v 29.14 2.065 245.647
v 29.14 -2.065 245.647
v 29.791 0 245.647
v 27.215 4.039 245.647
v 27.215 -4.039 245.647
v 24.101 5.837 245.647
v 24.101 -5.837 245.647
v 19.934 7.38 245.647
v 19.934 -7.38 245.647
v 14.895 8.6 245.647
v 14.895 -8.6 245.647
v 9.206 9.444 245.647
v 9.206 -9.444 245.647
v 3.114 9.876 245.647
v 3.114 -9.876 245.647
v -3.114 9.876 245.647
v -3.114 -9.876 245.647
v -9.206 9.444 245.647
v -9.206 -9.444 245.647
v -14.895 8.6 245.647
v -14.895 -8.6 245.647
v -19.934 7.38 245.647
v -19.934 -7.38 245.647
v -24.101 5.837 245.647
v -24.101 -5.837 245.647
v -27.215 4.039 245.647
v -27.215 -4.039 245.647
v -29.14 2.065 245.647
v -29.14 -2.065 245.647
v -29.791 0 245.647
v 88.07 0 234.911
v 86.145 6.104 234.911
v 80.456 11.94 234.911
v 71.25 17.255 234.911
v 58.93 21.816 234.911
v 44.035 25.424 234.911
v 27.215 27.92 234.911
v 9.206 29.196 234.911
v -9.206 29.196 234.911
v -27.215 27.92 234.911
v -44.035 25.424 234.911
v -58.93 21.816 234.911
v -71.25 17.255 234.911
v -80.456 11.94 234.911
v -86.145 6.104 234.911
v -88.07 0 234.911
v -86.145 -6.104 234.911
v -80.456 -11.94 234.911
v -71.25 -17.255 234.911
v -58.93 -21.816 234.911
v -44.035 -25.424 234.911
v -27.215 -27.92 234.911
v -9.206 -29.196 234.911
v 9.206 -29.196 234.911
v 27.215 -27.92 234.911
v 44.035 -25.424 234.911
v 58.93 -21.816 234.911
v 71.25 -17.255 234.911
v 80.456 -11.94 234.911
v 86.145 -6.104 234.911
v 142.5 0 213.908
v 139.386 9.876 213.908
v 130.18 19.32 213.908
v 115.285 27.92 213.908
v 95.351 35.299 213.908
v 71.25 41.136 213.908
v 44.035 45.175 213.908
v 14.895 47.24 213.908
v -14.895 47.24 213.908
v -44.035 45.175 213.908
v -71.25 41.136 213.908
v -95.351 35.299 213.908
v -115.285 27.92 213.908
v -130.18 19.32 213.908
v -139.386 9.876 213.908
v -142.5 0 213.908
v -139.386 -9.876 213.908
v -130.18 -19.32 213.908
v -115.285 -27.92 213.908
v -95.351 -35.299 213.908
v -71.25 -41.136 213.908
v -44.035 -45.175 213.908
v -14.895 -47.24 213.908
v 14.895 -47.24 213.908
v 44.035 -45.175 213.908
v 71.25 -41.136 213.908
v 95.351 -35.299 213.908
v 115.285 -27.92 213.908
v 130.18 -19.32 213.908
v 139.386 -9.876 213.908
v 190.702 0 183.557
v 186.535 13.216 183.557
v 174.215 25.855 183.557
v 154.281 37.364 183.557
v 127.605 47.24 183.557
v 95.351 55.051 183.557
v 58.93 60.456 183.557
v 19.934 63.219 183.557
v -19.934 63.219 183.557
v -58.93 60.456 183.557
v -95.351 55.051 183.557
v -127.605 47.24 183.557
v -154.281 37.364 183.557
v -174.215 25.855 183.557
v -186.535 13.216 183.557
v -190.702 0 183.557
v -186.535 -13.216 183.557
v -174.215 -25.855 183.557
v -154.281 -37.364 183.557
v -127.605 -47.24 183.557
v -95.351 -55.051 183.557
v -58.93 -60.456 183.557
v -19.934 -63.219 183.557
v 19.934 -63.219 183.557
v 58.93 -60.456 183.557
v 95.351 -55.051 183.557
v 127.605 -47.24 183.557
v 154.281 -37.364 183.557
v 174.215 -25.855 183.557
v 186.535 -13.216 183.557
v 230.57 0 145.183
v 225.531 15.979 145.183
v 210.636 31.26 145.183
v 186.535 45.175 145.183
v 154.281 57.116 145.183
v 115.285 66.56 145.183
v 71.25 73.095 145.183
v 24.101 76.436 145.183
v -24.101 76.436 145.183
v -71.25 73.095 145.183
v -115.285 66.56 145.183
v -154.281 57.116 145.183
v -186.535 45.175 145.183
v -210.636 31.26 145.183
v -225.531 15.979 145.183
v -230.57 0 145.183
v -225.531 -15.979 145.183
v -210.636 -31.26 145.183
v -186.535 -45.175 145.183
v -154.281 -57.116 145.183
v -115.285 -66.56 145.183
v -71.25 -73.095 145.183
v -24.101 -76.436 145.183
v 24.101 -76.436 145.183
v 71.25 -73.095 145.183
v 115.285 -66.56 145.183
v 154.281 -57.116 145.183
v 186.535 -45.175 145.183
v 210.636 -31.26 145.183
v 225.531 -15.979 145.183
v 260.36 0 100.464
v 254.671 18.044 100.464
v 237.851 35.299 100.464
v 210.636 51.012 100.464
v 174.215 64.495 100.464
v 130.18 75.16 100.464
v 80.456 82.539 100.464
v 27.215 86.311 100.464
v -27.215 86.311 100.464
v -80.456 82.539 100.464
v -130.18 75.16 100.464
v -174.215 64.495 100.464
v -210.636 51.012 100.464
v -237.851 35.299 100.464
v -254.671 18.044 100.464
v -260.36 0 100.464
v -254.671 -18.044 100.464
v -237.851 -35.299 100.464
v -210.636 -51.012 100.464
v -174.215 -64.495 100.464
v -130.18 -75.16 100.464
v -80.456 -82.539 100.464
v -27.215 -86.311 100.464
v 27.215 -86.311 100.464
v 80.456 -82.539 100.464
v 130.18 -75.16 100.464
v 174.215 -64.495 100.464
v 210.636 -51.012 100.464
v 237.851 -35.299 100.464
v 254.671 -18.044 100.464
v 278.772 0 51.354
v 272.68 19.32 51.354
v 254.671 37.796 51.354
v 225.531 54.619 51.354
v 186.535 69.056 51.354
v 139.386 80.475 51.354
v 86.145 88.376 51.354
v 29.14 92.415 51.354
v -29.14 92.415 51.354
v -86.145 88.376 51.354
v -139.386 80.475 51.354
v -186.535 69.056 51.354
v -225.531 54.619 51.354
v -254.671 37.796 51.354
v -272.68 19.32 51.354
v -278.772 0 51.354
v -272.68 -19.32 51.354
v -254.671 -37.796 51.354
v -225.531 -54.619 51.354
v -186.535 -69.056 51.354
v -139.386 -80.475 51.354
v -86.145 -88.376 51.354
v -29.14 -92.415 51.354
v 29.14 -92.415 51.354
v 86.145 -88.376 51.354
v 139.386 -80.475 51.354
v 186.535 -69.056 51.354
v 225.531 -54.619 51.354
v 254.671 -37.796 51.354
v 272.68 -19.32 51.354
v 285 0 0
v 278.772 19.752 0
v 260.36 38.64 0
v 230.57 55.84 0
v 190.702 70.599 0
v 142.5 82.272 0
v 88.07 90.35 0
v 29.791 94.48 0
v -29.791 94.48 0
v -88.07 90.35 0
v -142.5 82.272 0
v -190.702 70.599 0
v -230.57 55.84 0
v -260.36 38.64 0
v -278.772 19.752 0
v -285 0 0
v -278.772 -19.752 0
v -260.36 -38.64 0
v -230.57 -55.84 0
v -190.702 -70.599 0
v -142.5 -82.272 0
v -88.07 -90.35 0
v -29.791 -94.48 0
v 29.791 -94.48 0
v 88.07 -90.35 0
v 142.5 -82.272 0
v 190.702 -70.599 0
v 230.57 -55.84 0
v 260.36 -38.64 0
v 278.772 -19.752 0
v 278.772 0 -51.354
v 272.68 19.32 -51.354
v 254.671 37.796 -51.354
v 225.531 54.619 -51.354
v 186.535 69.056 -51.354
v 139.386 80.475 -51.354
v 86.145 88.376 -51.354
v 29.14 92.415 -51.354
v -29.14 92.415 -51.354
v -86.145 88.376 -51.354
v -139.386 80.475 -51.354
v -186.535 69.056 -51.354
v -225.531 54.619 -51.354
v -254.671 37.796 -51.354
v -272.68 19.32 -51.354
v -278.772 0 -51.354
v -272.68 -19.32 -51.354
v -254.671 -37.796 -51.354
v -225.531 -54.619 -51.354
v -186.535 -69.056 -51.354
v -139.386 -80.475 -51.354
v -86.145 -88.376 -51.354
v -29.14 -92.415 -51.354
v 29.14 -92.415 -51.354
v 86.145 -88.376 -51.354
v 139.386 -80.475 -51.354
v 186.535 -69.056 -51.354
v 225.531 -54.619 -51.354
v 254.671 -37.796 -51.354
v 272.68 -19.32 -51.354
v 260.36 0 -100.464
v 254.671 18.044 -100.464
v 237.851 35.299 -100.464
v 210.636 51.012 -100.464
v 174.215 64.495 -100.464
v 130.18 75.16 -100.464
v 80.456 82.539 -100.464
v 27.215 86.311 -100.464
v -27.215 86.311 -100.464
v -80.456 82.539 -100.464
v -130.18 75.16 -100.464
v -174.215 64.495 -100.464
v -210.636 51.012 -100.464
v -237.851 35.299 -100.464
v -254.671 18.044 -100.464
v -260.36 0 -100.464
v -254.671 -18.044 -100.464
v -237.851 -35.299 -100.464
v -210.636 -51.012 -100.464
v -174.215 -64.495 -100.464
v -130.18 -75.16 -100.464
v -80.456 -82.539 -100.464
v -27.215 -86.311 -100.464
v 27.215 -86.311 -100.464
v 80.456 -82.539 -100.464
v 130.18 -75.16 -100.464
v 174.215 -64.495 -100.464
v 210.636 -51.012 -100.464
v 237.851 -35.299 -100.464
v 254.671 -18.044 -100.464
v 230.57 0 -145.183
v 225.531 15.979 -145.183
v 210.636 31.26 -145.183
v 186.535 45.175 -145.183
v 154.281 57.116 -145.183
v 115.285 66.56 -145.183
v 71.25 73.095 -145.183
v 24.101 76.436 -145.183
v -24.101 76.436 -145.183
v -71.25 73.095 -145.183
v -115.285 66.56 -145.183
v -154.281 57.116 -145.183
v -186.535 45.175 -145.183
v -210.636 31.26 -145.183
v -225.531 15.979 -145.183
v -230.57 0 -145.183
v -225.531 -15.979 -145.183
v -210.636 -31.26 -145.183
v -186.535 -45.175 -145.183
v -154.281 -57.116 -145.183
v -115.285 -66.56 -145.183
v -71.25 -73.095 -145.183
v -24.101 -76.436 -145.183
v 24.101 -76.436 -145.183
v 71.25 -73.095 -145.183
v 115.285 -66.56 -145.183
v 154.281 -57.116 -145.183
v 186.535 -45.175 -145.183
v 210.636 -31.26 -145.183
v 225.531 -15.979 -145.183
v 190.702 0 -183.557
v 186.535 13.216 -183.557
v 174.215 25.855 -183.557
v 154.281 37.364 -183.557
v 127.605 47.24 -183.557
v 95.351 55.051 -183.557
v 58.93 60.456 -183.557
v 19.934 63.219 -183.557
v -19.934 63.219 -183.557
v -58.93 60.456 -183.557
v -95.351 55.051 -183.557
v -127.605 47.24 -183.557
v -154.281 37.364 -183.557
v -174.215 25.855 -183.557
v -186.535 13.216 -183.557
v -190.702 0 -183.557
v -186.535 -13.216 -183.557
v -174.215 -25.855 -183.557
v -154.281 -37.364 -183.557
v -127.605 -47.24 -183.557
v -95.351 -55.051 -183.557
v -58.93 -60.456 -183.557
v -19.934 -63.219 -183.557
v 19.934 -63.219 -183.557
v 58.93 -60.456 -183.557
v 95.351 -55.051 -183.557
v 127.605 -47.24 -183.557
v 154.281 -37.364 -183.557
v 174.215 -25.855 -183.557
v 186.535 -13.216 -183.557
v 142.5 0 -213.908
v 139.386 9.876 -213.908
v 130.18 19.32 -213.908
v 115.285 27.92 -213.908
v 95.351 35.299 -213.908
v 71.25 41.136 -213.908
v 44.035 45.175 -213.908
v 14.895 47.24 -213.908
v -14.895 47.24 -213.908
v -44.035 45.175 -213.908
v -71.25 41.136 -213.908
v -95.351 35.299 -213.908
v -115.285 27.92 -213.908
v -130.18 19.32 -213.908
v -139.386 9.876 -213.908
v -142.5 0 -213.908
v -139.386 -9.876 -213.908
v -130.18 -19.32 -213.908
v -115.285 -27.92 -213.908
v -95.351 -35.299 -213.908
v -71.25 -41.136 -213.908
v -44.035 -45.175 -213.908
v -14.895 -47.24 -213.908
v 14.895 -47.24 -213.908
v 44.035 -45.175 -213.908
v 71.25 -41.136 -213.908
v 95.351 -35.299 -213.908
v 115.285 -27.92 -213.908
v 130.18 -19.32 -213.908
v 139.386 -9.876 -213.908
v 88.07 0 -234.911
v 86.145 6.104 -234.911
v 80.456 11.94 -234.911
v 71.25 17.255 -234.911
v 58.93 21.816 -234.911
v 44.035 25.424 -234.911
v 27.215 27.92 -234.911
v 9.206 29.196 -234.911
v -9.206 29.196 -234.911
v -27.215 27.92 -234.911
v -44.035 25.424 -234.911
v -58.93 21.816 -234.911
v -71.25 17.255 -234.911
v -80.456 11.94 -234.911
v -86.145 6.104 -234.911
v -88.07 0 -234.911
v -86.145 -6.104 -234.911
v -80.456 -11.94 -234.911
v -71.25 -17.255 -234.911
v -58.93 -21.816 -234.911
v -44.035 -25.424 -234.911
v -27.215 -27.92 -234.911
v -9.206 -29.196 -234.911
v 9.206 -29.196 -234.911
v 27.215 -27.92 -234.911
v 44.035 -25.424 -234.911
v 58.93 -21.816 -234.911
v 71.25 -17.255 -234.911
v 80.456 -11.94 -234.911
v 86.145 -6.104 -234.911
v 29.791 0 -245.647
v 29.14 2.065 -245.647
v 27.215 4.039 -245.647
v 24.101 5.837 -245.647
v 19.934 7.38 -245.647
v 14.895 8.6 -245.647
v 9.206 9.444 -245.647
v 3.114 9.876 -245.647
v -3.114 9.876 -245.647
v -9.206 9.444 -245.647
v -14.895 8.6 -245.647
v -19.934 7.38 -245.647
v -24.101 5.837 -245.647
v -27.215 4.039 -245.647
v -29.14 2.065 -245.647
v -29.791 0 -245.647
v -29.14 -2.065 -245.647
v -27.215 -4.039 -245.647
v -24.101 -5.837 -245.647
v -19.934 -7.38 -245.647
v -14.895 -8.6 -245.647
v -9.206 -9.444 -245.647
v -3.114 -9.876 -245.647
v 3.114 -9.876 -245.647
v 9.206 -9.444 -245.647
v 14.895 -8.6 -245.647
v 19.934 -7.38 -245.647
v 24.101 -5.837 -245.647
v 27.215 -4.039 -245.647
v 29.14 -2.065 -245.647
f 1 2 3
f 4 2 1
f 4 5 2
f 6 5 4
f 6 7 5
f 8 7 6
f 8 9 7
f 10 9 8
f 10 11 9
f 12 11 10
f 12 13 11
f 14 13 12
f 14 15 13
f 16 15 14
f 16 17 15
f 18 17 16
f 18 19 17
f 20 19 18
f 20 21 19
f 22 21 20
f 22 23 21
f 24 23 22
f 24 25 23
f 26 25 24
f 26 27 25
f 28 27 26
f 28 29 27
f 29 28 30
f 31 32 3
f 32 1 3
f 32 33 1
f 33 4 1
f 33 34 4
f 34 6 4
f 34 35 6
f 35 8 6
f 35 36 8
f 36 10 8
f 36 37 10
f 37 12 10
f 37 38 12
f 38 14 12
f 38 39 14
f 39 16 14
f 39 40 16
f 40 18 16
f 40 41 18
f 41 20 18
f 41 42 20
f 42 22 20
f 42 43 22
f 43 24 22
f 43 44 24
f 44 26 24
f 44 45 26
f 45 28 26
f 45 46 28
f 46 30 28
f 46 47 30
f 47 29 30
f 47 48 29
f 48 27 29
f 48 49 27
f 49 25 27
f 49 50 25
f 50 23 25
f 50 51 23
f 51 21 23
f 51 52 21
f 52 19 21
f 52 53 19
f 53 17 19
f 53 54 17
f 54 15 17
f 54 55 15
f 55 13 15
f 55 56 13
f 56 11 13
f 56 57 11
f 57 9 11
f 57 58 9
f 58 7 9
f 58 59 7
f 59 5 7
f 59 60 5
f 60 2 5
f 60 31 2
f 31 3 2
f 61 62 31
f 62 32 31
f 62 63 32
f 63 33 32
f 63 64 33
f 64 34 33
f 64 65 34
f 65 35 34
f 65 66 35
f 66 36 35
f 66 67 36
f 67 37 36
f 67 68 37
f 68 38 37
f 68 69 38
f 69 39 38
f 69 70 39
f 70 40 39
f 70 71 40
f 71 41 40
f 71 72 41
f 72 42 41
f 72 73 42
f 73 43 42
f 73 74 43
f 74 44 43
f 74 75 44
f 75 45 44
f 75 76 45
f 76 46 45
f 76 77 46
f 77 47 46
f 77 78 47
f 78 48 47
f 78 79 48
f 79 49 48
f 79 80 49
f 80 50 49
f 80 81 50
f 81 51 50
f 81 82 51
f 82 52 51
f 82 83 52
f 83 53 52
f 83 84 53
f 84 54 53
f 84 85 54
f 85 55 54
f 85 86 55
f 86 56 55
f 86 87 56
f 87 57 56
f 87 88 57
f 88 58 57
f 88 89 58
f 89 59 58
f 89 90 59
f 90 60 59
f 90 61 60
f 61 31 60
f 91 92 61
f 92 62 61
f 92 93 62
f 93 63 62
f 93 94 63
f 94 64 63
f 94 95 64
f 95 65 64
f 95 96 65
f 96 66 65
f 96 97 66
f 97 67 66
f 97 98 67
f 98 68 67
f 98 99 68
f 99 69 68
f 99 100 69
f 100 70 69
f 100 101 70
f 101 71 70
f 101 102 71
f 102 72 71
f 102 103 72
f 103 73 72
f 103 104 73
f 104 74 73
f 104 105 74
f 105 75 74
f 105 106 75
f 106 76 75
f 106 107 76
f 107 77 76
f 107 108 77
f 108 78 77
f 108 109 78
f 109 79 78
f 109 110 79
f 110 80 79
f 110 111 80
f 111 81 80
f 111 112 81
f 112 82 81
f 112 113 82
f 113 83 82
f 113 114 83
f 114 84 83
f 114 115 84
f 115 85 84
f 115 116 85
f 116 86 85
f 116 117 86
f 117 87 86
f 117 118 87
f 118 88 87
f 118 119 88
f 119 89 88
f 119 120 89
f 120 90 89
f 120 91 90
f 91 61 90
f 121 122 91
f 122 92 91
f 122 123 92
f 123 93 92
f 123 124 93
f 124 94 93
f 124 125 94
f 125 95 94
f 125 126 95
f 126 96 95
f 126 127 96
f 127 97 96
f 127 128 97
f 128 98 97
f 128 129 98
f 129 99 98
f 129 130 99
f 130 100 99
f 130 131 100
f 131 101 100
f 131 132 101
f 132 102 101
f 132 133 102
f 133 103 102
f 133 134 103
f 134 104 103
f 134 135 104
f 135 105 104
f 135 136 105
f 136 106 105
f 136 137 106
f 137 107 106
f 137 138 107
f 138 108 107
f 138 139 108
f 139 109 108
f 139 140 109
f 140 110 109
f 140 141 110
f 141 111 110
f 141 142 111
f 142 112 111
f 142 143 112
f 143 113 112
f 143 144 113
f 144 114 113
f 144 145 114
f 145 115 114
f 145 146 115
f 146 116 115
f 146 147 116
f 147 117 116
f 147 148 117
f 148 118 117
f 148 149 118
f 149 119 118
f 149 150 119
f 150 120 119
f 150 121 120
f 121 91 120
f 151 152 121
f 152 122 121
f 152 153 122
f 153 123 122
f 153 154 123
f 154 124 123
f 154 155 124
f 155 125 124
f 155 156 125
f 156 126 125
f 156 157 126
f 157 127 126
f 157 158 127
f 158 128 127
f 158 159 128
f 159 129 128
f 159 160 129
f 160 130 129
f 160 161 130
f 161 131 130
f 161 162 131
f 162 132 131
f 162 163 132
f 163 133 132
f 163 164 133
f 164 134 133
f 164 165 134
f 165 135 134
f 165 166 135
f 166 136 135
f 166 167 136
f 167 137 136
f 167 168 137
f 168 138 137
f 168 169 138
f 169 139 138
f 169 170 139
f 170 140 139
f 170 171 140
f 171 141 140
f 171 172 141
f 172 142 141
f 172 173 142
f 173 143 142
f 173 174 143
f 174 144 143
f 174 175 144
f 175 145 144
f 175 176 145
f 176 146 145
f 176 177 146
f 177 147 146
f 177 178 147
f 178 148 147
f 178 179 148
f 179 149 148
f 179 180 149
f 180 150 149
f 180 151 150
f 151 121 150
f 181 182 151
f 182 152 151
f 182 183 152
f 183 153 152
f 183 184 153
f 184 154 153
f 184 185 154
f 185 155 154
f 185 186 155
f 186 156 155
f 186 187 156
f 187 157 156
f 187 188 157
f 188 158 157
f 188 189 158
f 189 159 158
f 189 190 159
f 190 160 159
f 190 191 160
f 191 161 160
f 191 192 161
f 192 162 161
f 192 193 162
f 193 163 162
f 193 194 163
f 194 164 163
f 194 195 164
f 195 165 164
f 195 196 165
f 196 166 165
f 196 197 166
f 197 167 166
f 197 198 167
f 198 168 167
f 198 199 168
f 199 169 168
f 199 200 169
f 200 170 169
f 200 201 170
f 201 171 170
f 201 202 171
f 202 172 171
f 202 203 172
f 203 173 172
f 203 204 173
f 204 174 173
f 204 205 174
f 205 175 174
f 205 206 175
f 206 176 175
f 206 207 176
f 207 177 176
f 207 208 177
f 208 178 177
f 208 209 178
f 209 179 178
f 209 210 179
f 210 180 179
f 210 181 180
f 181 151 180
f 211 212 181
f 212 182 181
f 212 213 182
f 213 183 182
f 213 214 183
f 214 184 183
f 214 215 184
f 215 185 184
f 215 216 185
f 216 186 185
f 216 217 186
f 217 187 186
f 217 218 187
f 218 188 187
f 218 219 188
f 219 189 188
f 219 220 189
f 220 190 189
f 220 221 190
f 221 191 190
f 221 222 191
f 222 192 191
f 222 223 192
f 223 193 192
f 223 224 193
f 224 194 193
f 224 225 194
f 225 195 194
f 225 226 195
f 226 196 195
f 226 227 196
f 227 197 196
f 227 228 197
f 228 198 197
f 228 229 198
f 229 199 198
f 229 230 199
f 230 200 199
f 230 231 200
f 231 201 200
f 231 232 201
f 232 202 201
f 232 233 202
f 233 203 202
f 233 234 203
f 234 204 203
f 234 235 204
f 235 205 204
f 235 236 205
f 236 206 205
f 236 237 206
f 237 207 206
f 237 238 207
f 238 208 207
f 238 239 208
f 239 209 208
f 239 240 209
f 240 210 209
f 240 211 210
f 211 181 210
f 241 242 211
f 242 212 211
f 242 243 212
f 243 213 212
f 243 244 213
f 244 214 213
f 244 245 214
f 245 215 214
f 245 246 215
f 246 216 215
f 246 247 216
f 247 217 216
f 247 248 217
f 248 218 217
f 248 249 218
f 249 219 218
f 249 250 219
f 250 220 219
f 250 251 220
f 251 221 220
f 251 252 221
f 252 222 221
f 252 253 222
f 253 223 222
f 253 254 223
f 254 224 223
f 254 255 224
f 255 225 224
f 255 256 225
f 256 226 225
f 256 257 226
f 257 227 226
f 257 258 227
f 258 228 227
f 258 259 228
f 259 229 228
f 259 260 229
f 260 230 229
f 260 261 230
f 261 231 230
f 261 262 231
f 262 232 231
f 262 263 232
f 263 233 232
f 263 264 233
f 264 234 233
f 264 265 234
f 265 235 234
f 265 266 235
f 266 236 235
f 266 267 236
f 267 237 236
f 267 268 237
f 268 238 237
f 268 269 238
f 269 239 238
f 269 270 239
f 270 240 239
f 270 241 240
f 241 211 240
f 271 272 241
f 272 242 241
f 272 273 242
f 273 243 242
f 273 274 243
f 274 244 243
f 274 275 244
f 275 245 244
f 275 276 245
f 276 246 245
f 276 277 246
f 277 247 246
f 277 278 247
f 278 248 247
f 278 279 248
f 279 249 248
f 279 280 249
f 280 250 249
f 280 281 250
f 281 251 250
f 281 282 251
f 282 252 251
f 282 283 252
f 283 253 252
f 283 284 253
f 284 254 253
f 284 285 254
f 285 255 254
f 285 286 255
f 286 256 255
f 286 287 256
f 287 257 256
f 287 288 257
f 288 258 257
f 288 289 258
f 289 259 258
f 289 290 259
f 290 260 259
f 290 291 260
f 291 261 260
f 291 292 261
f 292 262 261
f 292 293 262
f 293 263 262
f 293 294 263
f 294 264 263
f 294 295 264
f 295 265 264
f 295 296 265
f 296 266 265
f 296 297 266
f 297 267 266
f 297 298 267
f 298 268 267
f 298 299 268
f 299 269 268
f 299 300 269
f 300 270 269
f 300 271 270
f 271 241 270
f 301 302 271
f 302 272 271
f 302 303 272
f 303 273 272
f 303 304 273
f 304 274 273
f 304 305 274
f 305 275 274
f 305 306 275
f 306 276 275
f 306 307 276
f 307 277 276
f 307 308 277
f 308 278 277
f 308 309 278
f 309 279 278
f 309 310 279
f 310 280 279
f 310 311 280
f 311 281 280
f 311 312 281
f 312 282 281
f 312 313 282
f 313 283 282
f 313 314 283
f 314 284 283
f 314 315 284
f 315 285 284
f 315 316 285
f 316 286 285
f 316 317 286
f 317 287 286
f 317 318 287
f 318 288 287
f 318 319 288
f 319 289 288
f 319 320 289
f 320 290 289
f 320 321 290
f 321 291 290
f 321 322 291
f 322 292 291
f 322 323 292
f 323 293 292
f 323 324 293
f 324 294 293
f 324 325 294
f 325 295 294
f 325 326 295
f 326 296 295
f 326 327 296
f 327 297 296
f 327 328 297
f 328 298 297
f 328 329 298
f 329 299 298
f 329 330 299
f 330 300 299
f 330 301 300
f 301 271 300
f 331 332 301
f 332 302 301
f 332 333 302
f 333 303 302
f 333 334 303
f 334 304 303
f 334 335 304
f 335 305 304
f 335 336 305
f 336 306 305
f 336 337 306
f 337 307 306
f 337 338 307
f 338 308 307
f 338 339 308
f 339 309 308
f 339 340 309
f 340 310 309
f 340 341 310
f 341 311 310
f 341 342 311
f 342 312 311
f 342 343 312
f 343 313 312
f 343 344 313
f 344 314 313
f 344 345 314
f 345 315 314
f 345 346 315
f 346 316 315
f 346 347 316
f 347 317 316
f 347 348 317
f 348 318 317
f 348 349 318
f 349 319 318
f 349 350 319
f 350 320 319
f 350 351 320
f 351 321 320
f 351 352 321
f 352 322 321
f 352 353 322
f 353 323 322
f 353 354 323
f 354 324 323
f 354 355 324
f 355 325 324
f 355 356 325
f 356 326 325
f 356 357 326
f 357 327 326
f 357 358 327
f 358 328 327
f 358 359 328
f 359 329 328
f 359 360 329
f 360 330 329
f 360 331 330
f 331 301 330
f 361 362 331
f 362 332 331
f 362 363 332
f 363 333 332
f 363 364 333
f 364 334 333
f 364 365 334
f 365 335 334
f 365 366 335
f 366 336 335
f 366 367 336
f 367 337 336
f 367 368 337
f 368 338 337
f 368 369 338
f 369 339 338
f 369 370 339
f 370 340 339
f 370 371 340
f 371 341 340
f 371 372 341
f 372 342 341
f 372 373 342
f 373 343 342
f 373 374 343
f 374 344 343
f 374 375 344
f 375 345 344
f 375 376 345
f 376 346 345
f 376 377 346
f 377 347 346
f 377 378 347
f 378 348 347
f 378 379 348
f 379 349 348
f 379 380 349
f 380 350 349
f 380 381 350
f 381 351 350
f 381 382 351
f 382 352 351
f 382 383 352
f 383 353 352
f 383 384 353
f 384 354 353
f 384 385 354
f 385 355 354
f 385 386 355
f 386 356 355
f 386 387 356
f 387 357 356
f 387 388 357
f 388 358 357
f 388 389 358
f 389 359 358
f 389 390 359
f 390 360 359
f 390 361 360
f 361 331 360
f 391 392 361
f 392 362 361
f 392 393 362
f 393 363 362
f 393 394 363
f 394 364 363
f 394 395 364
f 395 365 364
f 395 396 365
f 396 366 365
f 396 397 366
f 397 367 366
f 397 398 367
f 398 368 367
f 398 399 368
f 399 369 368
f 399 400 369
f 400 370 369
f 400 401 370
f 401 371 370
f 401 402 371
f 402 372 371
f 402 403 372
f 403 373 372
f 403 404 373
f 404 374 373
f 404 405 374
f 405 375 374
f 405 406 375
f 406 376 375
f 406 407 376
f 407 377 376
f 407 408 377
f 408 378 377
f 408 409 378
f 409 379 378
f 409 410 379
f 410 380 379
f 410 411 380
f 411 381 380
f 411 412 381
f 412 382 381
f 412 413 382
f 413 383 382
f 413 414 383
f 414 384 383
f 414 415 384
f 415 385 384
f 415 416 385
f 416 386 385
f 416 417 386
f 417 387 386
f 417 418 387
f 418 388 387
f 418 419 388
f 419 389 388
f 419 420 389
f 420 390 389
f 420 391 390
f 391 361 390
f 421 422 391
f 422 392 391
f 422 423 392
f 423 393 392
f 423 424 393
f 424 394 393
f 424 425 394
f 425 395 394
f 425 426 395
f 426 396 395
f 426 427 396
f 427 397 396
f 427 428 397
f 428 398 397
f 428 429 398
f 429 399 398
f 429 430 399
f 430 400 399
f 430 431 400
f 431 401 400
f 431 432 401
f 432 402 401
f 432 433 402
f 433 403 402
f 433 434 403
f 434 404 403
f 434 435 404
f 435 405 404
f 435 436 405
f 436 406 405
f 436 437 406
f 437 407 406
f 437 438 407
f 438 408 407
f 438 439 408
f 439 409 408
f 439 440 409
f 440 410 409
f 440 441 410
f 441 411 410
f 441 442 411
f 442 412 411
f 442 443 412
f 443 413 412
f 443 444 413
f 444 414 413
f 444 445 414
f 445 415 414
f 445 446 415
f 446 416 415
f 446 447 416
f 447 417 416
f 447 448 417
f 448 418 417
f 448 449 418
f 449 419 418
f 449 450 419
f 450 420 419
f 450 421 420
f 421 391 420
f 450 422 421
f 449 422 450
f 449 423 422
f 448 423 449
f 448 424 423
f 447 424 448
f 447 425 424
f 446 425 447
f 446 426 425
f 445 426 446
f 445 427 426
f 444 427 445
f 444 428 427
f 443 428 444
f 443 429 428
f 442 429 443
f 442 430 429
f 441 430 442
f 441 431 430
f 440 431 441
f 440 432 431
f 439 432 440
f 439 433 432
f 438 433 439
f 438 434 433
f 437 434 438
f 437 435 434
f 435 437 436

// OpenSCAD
// Generated by SolidPython 1.0.1 on 2020-07-29 00:46:51


scale(v = [15, 5, 13]) {
	sphere(r = 19);
}
/***********************************************
*********      SolidPython code:      **********
************************************************
 
# import packages: SolidPython
from solid import *
from solid.utils import *
from itertools import chain, combinations, permutations


class Resize:

    def __init__(self, scad_file):
        self.scad_file = scad_file
        #self.scad_file = import_scad(scad_file)
        # cone/cylinder param:
        self.r1 = 0
        self.r2 = 0
        self.h = 0
        # rectangular prism param:
        self.w = 0
        self.l = 0
        # ellipse param:
        self.r = 0

    # import OpenScad code (file name corresponds to shape)


    # classify shape + parameters
    def assign(self, param1, param2, param3):
        if self.scad_file == 'cone.scad':
            self.r1 = param1
            self.r2 = param2
            self.h = param3
        elif self.scad_file == 'cylinder.scad':
            self.r1 = param1
            self.r2 = param2
            self.h = param3
        elif self.scad_file == 'rectangularPrism.scad':
            self.h = param1
            self.l = param2
            self.w = param3
        else:
            self.r = param1
            self.h = param2

    # resize parameters
    def iterate(self):
        x = range(3, 20, 2)
        i = 1
        if self.scad_file == 'cone.scad':
            tempList = list(permutations(x, 2))
            for temp in tempList:
                param1 = temp[0]
                param2 = temp[1]
                filepath = 'produced_scad_files/' + 'cone' + str(param1) + '_' + str(param2) + '_' + '.scad'
                scad_render_to_file(cylinder(h=param1, r1=param2, r2=0), filepath)

        elif self.scad_file == 'cylinder.scad':
            tempList = list(permutations(x, 3))
            for temp in tempList:
                param1 = temp[0]
                param2 = temp[1]
                filepath = 'produced_scad_files/' + 'cylinder' + str(param1) + '_' + str(param2) + '_' + '.scad'
                scad_render_to_file(cylinder(h=param1, r1=param2, r2=param2), filepath)

        elif self.scad_file == 'rectangularPrism.scad':
            tempList = list(permutations(x, 3))
            for temp in tempList:
                param1 = temp[0]
                param2 = temp[1]
                param3 = temp[2]
                filepath = 'produced_scad_files/' + 'rectangularPrism' + str(param1) + '_' + str(param2) + '_' + str(
                    param3) + '.scad'
                scad_render_to_file(cube(size=(param1, param2, param3)), filepath)

        elif self.scad_file == 'ellipse.scad':
            tempList = list(permutations(x, 4))
            for temp in tempList:
                param1 = temp[0]
                param2 = temp[1]
                param3 = temp[2]
                param4 = temp[3]
                filepath = 'produced_scad_files/' + 'ellipse' + str(param1) + '_' + str(param2) + '_' + str(param3) + '_' + str(param4) + '.scad'
                scad_render_to_file(scale([param1, param2, param3])(sphere(r=param4)), filepath)

    def render_to_scadfile(self):
        scad_render_to_file(scad, 'example.scad') 
 
************************************************/
